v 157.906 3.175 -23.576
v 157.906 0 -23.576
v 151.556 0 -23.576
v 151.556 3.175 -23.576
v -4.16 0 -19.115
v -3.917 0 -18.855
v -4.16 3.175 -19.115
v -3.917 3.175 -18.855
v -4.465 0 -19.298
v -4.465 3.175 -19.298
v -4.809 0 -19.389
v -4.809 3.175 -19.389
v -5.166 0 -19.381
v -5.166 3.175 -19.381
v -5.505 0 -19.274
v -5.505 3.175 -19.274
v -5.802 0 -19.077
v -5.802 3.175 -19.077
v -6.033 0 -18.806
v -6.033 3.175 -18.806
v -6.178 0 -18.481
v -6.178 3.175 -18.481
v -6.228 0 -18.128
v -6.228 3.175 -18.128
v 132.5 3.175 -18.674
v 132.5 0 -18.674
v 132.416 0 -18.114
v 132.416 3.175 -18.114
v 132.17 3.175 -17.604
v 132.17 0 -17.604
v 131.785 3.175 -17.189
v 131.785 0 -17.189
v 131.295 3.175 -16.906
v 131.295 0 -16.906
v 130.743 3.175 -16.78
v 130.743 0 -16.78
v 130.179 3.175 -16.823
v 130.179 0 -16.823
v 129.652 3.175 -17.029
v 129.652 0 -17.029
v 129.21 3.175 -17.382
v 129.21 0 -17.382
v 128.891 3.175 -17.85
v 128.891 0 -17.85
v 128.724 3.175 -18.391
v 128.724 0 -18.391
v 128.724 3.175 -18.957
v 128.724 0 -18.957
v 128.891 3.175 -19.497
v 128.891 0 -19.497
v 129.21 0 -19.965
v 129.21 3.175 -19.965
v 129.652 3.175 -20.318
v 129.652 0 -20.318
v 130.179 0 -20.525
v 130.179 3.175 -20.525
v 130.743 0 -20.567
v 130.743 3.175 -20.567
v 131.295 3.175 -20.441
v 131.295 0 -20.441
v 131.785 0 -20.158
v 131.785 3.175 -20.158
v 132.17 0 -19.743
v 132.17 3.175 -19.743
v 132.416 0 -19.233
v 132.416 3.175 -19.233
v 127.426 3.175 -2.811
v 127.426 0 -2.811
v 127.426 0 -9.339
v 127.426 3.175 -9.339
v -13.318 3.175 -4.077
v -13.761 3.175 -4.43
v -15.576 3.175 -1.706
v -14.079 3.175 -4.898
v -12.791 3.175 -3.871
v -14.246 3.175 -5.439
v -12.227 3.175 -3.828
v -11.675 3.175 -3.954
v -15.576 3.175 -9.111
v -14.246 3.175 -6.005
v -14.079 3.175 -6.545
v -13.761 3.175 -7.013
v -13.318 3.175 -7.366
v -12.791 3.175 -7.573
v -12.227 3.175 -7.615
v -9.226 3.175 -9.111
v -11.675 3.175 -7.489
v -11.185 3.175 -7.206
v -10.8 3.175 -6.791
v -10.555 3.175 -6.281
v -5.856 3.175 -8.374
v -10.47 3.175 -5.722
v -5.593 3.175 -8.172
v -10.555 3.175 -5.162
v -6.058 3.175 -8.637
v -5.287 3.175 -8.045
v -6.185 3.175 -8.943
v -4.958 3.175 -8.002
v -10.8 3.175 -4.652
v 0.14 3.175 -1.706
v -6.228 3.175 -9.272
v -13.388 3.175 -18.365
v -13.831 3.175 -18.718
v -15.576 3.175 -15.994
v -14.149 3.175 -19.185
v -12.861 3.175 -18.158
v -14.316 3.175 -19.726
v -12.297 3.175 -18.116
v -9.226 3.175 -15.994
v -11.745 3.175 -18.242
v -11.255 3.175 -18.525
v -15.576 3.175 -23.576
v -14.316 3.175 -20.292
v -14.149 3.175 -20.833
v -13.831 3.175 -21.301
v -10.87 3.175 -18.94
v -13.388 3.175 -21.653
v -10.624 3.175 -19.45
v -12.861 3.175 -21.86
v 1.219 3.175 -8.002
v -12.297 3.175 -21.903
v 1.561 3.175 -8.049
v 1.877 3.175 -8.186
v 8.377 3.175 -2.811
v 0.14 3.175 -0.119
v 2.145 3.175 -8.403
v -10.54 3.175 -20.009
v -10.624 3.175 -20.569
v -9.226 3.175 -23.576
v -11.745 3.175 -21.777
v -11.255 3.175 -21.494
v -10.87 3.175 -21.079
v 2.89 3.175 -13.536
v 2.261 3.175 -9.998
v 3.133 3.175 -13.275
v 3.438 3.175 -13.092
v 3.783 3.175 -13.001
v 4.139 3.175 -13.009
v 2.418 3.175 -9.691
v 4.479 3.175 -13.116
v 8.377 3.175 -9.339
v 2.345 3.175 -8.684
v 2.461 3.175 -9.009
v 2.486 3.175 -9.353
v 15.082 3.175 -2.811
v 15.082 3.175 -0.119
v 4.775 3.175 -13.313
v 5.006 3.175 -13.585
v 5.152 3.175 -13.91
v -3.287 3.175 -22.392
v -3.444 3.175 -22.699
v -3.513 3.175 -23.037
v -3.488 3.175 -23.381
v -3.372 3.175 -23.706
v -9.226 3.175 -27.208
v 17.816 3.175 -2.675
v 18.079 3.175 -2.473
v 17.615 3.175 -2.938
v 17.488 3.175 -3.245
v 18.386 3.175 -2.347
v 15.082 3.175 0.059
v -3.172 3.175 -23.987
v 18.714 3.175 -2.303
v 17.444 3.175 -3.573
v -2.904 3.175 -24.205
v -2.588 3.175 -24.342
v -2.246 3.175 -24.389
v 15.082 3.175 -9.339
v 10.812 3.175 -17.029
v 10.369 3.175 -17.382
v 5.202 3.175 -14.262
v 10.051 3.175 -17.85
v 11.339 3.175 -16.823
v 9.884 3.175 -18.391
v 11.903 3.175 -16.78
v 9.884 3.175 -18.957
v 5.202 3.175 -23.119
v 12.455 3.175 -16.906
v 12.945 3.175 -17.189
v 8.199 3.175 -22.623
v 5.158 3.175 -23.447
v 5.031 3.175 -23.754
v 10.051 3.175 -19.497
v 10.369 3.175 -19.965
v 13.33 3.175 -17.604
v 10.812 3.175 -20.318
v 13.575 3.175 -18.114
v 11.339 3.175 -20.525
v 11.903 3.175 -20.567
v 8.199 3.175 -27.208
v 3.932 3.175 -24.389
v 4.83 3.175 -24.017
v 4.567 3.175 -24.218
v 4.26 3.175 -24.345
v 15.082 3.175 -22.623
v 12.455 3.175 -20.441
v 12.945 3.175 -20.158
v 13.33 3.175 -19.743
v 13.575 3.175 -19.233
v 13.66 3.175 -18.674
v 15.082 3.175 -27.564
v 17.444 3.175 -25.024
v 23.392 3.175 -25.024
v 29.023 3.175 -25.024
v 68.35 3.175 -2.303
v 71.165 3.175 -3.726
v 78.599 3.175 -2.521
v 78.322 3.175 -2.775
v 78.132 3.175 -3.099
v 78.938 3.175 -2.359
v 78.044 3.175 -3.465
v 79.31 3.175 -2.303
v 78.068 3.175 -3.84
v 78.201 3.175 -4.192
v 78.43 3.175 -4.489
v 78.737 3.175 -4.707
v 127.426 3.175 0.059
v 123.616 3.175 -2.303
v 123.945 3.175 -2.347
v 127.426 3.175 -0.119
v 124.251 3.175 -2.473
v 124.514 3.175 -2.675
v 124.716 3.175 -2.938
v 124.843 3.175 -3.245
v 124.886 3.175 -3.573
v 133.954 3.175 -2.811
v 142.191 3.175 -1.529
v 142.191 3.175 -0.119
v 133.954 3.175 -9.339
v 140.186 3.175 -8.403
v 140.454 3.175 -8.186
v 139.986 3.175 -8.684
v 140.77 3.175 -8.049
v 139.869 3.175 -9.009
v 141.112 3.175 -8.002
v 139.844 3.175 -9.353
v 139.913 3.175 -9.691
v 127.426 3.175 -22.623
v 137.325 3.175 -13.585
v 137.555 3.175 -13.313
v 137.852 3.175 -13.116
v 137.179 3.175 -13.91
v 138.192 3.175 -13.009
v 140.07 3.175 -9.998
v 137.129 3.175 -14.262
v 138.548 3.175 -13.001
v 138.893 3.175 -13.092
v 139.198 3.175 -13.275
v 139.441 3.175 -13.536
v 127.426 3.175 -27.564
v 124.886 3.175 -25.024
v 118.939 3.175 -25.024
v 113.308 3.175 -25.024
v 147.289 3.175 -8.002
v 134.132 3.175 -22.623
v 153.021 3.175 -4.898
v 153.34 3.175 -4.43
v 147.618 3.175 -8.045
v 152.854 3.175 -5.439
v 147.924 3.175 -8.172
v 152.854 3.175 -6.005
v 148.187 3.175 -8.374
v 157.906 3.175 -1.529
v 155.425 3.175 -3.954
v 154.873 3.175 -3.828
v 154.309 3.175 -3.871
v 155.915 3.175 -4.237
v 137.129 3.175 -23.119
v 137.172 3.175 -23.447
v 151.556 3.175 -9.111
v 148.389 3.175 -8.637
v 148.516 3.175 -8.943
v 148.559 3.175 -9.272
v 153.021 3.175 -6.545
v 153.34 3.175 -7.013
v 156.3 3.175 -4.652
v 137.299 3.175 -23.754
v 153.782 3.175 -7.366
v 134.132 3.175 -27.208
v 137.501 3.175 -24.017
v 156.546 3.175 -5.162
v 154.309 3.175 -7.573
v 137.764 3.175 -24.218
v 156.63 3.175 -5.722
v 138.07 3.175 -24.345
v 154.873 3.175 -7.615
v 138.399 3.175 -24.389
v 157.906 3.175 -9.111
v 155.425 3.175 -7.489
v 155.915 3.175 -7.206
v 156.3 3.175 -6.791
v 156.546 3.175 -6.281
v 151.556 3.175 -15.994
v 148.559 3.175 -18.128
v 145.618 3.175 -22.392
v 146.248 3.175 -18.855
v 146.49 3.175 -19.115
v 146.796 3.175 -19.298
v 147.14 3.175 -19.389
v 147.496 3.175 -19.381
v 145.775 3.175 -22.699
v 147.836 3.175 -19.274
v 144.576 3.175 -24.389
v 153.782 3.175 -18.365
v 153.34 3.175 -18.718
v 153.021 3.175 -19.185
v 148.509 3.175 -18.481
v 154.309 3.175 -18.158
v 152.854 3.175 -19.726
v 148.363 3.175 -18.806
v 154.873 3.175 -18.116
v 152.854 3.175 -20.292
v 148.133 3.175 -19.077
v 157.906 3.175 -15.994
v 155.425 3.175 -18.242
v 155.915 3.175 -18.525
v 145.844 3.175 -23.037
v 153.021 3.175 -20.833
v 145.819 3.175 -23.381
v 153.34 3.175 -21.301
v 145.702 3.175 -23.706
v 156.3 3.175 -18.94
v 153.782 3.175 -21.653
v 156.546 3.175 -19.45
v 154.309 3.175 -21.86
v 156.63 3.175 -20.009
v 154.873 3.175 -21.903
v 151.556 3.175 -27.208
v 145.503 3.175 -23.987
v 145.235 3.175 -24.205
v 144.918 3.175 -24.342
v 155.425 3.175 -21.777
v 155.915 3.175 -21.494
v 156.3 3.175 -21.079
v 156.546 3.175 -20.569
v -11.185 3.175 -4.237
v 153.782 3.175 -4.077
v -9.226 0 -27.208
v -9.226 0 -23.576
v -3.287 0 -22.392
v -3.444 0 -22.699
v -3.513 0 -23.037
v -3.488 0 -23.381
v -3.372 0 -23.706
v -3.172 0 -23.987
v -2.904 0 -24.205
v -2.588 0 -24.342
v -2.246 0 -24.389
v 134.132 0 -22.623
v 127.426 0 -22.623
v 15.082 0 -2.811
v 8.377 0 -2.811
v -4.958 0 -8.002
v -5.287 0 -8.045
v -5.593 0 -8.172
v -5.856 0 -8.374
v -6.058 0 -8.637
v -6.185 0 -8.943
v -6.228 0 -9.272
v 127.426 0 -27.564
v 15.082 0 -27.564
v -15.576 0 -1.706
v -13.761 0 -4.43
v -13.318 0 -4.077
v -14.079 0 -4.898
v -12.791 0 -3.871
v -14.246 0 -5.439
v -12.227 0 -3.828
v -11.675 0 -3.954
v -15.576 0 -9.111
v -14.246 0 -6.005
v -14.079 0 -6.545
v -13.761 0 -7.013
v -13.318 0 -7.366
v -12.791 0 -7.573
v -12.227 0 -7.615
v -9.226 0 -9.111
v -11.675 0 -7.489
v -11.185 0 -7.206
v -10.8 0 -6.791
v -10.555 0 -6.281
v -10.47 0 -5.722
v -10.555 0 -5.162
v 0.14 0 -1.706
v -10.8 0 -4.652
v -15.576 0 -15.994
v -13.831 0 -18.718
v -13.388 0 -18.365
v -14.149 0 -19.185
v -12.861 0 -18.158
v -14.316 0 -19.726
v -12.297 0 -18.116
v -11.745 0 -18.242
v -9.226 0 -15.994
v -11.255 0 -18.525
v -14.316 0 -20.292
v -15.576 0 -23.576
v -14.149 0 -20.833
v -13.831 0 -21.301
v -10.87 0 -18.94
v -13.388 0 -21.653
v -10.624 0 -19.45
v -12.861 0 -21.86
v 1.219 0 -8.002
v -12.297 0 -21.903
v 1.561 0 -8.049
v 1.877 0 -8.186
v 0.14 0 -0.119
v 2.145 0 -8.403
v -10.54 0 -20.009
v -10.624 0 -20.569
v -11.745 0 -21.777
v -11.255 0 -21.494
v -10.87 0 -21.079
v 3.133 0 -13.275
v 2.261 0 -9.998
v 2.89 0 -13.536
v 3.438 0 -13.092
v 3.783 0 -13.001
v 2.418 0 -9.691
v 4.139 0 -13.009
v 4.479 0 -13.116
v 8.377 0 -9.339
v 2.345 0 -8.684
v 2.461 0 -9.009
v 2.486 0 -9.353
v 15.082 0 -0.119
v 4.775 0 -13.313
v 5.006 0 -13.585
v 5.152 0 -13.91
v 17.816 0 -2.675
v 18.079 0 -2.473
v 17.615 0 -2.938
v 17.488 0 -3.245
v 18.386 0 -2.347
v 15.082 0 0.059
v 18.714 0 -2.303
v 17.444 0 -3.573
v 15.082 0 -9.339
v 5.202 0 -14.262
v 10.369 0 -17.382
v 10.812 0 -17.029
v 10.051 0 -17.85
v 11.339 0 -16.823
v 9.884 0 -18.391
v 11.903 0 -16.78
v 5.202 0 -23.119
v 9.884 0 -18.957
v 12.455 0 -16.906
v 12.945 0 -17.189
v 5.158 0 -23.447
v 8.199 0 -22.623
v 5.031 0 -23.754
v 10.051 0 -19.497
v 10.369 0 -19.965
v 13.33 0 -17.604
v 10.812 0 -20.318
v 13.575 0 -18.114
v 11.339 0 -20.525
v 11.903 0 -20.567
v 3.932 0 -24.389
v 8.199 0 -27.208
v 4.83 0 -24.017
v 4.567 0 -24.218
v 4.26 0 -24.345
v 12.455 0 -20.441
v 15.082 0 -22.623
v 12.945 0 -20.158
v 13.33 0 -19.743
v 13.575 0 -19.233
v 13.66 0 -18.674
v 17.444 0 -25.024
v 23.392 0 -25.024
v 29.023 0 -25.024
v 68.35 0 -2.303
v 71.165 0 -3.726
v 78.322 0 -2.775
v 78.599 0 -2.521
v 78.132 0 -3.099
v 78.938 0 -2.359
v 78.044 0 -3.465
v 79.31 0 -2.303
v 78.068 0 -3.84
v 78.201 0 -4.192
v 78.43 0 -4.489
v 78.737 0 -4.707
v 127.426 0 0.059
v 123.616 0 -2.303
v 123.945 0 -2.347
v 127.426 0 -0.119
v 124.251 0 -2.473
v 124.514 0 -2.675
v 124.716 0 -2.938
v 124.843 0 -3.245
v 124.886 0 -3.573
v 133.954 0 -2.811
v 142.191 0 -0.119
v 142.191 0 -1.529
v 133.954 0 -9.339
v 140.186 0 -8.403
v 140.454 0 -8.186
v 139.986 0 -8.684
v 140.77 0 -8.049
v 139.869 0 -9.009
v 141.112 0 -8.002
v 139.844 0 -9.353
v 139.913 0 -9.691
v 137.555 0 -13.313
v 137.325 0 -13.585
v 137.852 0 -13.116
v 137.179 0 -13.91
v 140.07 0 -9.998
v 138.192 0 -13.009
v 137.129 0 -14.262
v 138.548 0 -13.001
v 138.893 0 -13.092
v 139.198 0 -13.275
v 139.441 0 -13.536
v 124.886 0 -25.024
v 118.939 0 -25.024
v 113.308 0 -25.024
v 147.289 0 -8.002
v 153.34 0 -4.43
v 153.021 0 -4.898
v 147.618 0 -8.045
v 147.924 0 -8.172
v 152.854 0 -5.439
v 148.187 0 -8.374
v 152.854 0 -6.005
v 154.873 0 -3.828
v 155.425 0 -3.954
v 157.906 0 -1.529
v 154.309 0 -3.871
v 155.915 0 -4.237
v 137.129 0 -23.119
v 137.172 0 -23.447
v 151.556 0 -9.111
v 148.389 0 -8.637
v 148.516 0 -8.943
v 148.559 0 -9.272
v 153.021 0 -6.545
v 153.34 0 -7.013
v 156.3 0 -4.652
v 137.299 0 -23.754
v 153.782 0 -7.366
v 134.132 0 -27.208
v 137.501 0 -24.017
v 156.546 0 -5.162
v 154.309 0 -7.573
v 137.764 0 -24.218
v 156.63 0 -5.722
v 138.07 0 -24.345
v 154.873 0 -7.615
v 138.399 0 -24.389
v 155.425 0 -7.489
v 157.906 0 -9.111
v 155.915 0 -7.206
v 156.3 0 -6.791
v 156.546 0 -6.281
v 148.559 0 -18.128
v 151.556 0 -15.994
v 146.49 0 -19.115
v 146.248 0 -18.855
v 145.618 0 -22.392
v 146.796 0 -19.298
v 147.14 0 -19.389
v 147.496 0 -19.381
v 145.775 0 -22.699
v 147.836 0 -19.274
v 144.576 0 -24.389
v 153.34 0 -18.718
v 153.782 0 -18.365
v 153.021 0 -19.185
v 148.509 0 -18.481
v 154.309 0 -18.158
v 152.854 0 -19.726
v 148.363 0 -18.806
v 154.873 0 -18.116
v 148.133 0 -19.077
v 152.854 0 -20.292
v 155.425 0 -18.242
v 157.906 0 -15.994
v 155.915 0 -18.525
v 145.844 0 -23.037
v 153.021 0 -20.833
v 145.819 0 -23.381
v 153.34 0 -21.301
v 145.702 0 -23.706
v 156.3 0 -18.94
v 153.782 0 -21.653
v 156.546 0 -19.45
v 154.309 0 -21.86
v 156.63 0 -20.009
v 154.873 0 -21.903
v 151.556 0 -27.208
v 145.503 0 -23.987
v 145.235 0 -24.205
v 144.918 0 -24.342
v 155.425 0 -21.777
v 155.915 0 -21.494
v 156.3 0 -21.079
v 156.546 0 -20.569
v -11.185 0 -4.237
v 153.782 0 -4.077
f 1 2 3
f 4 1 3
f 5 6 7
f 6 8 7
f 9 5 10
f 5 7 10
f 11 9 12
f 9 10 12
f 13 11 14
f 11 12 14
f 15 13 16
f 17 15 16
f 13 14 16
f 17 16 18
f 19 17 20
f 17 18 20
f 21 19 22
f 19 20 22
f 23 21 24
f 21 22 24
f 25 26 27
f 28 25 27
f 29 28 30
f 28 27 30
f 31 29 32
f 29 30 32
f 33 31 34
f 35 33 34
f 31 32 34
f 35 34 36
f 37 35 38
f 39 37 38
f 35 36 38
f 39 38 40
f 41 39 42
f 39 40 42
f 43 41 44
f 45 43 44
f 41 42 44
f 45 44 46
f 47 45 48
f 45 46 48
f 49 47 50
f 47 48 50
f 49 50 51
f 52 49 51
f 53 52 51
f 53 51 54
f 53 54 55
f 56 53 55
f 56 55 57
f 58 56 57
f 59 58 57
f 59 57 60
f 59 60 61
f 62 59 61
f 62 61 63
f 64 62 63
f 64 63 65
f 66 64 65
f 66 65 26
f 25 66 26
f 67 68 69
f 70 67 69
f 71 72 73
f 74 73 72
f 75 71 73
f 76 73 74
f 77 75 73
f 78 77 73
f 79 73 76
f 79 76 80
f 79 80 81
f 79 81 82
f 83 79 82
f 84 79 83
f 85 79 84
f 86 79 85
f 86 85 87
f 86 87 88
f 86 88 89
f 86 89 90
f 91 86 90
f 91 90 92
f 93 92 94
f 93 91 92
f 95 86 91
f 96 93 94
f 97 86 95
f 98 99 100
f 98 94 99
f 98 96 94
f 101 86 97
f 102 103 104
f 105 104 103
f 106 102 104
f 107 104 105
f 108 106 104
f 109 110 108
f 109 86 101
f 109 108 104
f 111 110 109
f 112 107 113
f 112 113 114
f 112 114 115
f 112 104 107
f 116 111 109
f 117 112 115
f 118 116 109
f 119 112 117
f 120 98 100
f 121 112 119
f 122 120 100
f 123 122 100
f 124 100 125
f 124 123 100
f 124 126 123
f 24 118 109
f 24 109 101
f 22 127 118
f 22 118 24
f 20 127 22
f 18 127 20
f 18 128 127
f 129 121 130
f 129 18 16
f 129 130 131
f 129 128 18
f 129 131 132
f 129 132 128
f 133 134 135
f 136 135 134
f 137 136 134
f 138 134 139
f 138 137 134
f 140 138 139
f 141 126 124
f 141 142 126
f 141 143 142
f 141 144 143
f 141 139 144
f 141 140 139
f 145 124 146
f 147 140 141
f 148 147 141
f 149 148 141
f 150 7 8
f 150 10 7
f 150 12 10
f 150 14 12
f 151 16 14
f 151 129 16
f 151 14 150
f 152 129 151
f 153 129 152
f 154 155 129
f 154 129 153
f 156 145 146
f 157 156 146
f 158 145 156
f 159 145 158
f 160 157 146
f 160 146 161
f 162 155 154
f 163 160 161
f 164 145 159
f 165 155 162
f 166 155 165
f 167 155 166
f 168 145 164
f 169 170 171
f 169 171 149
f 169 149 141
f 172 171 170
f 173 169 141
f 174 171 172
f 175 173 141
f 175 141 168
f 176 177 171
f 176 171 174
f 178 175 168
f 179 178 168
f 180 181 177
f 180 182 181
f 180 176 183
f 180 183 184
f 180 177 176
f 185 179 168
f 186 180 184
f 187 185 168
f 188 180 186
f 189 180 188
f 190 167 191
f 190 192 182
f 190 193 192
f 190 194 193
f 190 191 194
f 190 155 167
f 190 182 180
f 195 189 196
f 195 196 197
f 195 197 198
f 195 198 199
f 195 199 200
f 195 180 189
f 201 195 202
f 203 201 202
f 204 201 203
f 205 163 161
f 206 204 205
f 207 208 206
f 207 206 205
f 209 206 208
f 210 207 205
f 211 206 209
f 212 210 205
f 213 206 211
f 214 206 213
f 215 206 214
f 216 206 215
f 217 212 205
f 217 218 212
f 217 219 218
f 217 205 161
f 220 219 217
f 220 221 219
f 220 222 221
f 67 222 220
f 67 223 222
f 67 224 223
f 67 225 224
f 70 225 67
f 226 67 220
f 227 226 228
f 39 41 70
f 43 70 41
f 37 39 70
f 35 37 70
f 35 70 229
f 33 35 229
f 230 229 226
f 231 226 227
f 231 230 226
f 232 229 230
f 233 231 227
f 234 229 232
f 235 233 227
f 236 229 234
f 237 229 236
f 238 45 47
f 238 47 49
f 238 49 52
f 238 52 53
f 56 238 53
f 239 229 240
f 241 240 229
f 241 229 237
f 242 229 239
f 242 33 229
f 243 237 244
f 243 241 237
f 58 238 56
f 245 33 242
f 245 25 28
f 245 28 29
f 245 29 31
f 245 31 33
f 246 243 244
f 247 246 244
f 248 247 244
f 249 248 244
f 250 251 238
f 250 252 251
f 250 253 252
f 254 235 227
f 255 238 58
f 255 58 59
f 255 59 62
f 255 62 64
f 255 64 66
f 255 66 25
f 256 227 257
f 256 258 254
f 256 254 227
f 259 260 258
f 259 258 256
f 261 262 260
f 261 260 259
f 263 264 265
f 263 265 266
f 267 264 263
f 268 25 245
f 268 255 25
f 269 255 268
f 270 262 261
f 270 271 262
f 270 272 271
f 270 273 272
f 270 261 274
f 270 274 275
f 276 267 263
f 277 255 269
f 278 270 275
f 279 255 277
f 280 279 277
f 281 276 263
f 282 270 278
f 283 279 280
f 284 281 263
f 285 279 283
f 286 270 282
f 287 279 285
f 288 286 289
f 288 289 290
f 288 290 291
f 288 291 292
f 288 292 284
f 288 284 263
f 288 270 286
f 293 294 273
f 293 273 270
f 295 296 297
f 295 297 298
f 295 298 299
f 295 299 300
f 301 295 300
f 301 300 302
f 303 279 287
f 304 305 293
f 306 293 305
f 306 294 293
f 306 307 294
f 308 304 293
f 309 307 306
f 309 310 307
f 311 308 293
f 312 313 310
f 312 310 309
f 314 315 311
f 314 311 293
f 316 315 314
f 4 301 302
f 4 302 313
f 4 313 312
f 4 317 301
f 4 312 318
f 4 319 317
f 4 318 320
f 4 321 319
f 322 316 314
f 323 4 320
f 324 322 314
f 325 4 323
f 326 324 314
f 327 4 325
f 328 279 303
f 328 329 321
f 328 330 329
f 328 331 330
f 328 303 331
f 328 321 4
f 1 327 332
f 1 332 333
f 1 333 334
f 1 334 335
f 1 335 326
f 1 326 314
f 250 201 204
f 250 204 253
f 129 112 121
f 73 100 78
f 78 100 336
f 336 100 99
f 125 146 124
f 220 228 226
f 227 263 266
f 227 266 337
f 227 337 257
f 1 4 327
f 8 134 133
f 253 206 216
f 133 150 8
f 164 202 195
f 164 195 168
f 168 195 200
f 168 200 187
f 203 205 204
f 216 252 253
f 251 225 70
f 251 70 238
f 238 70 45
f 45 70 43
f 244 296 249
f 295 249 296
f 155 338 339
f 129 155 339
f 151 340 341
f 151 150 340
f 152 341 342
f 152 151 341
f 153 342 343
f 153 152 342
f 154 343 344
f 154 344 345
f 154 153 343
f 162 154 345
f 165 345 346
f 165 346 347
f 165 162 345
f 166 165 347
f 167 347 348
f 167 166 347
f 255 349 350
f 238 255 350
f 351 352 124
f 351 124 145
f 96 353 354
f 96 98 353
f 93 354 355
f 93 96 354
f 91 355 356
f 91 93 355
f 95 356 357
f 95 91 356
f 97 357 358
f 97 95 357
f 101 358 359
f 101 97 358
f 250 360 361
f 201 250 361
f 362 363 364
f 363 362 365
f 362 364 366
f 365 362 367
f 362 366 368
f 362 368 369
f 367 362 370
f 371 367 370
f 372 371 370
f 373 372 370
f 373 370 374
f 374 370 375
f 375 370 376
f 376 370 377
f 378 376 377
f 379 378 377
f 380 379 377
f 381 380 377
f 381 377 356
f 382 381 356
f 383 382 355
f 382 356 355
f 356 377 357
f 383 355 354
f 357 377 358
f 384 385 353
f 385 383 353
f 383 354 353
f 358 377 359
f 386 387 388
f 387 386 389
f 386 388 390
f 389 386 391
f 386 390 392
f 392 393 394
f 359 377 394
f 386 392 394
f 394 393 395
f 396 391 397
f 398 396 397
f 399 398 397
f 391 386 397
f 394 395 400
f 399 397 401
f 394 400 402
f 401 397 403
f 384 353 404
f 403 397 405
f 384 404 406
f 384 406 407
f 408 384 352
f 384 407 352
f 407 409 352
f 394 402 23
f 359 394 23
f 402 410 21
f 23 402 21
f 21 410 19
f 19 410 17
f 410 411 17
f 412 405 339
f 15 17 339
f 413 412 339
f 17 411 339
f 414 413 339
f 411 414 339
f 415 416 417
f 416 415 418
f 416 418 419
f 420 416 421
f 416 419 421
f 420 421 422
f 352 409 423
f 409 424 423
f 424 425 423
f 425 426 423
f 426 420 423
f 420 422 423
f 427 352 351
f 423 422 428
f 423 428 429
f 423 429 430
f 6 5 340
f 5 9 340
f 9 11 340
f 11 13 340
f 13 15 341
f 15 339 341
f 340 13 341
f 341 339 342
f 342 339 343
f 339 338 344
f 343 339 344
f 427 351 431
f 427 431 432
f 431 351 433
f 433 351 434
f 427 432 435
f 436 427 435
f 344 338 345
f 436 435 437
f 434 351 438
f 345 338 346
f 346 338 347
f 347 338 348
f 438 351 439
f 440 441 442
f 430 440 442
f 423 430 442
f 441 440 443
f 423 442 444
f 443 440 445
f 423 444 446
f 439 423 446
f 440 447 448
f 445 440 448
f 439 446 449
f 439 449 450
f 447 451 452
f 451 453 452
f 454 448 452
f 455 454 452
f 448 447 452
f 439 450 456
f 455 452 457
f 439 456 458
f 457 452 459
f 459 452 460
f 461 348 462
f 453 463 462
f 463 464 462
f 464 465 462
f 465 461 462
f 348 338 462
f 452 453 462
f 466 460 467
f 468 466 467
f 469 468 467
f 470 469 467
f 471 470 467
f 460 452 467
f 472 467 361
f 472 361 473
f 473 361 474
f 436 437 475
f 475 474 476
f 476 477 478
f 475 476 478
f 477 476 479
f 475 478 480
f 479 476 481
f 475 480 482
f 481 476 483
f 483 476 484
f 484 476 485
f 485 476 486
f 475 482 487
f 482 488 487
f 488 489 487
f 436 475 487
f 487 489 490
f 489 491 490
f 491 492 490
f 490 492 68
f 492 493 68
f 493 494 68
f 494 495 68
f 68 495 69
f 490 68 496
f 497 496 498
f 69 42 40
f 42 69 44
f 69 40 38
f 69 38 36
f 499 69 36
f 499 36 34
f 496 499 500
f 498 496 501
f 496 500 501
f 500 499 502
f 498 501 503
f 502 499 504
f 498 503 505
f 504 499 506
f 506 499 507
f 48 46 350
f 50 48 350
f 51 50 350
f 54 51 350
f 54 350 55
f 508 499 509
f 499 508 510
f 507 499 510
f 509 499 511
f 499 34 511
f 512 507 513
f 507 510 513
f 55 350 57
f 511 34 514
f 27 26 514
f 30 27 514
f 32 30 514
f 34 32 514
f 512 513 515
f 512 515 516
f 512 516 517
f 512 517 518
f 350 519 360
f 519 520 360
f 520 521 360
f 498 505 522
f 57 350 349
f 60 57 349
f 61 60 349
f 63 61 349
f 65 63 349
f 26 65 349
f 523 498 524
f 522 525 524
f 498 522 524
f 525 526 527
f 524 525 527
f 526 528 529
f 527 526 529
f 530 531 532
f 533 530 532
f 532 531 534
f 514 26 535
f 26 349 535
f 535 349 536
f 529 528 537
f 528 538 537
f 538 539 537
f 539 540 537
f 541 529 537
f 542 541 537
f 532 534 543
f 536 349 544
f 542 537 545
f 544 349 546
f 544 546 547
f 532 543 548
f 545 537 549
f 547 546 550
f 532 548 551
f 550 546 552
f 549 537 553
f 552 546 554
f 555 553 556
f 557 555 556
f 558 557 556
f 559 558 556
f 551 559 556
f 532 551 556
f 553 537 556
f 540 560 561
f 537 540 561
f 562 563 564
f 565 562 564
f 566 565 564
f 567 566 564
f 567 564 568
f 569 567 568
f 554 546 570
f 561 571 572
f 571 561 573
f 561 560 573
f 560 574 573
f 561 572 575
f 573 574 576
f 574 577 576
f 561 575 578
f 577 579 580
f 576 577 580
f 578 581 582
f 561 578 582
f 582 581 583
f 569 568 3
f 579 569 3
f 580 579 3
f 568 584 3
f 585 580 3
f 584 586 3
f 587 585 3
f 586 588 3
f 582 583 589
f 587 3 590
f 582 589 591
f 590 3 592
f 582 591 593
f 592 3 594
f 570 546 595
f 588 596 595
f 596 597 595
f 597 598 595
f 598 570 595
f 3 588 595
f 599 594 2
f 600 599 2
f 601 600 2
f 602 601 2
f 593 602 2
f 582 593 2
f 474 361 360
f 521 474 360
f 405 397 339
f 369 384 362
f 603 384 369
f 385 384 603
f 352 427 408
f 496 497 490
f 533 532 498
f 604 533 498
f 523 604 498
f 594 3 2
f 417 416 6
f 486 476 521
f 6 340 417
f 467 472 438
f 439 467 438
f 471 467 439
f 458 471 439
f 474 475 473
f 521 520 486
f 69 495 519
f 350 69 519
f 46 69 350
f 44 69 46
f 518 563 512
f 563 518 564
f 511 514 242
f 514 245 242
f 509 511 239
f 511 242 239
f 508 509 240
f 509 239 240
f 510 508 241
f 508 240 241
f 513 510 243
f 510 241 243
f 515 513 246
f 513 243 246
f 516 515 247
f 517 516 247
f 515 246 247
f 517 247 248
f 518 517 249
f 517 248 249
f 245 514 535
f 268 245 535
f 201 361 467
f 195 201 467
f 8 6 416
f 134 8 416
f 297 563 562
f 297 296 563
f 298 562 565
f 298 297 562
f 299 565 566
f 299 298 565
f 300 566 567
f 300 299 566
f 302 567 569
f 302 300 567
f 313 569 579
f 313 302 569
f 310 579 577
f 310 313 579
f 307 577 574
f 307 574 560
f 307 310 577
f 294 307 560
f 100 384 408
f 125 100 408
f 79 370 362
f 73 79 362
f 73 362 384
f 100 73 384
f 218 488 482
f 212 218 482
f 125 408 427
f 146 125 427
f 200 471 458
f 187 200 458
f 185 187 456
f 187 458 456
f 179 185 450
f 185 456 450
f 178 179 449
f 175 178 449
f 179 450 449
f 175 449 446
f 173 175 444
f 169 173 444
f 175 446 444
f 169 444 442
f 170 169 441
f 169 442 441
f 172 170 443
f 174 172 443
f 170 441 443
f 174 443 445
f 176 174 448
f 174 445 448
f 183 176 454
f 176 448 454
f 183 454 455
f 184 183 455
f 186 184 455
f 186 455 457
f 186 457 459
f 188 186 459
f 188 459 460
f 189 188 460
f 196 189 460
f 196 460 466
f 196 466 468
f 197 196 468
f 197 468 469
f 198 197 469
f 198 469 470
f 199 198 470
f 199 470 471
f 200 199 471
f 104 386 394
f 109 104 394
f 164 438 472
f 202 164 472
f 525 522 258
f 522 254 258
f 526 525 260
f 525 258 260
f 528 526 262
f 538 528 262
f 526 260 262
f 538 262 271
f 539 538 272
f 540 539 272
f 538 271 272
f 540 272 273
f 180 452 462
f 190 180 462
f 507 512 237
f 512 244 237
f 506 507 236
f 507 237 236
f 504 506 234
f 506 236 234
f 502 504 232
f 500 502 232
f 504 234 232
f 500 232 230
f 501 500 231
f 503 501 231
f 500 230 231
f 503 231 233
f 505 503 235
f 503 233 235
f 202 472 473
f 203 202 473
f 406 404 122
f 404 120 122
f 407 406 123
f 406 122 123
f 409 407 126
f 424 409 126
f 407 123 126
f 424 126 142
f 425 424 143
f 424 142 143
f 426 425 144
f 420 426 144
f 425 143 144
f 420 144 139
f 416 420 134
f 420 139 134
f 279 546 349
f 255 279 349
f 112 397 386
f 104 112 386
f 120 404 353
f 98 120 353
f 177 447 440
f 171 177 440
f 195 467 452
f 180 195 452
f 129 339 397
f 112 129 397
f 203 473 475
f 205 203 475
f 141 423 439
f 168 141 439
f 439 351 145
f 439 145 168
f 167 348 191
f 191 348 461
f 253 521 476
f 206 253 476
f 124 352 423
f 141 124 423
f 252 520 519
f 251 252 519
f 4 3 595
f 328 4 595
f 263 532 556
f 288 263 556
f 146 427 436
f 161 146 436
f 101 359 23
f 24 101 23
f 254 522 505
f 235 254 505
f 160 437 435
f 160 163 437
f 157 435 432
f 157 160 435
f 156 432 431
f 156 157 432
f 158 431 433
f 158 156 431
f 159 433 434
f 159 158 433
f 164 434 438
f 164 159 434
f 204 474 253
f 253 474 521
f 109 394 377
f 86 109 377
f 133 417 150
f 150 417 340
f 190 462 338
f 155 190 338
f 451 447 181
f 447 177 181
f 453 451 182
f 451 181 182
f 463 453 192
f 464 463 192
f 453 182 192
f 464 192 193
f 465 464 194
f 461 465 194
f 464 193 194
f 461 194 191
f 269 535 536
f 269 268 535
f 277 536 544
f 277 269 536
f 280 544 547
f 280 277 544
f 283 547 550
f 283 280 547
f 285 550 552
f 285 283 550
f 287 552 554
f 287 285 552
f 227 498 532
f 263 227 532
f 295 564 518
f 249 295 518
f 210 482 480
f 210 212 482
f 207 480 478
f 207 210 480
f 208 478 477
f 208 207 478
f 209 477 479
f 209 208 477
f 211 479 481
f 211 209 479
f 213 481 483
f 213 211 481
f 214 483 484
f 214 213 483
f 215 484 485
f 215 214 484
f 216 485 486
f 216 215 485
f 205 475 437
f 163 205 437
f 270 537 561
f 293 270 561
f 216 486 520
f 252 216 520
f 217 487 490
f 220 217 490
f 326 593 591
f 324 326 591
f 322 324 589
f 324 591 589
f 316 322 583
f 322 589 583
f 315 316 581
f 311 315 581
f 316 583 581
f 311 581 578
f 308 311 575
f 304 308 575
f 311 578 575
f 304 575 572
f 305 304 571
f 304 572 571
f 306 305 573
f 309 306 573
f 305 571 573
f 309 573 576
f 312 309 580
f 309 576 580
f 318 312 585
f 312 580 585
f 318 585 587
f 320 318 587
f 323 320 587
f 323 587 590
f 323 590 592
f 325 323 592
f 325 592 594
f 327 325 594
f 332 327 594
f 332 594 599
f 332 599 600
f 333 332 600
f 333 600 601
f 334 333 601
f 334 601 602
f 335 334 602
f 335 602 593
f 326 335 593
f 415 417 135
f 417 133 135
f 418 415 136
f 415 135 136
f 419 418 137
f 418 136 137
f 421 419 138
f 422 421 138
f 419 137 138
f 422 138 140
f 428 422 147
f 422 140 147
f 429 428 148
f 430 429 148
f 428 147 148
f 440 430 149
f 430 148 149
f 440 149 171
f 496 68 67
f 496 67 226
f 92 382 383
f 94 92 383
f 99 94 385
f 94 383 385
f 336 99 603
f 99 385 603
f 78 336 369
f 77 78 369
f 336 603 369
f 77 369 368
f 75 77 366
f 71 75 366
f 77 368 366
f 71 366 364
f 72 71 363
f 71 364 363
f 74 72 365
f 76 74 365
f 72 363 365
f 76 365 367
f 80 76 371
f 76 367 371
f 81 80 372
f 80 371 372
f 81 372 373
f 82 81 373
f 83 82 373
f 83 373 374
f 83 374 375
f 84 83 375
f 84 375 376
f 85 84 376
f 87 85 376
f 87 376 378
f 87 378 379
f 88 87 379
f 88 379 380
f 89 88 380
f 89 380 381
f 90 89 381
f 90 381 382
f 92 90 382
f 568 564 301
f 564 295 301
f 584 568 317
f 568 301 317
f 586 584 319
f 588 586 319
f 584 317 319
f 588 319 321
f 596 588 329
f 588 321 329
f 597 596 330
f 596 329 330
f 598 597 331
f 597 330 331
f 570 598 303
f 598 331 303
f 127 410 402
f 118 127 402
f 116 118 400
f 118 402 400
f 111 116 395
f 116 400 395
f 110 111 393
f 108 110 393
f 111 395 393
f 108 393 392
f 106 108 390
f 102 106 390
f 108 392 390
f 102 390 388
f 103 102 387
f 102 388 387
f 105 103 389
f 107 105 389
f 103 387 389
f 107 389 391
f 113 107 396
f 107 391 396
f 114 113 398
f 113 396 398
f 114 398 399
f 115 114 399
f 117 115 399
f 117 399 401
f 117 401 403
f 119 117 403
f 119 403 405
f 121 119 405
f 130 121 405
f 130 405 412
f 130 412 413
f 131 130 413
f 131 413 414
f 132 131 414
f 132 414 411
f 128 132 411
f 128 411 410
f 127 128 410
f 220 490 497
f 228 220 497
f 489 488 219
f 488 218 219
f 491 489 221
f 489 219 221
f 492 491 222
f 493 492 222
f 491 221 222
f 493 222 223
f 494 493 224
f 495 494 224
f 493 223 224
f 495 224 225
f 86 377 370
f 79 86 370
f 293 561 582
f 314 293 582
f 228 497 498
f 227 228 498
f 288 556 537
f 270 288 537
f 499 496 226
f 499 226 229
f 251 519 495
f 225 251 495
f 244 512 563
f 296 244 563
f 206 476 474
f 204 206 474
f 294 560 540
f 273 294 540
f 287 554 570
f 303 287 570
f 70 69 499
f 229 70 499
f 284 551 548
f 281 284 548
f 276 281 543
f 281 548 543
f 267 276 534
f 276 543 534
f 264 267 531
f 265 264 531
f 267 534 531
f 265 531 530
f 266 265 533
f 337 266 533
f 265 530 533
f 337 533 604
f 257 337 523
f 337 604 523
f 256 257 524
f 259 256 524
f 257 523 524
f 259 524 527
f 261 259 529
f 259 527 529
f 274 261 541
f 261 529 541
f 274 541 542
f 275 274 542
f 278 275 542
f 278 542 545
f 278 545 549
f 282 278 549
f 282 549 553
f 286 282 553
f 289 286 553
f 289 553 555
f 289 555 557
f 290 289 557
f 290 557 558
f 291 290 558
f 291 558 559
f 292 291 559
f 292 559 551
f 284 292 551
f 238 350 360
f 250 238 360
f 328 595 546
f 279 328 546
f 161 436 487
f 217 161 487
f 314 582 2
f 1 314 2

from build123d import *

# Parameters (mm, degrees)
SKETCH1_W                 = 6.7056
SKETCH1_H                 = 6.5278
SKETCH1_W_2               = 6.5278
BOSS_EXTRUDE1_DEPTH       = 3.175
F_6_CLEARANCE_HOLE1_D     = 3.7973
F_6_CLEARANCE_HOLE1_DEPTH = 6.35
F_6_CLEARANCE_HOLE1_TIP   = 1.140824014
FILLET1_R                 = 1.27


with BuildPart() as part:
    # Sketch1 → Boss-Extrude1 (new body)
    with BuildSketch(Plane(origin=(0, 0, 0), x_dir=(1, 0, 0), z_dir=(0, 1, 0))):
        Polygon((127.426380641, 27.563643867), (15.082180641, 27.563643867), (15.082180641, 22.623343867), (8.198780641, 22.623343867), (8.198780641, 27.208043867), (-9.225619359, 27.208043867), (-9.225619359, 23.575843867), (-15.575619359, 23.575843867), (-15.575619359, 15.993943867), (-9.225619359, 15.993943867), (-9.225619359, 9.110543867), (-15.575619359, 9.110543867), (-15.575619359, 1.706443867), (0.1397, 1.706443867), (0.1397, 0.118943867), (15.082180641, 0.118943867), (15.082180641, -0.058856133), (127.426380641, -0.058856133), (127.426380641, 0.118943867), (142.191061281, 0.118943867), (142.191061281, 1.528643867), (157.906380641, 1.528643867), (157.906380641, 9.110543867), (151.556380641, 9.110543867), (151.556380641, 15.993943867), (157.906380641, 15.993943867), (157.906380641, 23.575843867), (151.556380641, 23.575843867), (151.556380641, 27.208043867), (134.131980641, 27.208043867), (134.131980641, 22.623343867), (127.426380641, 22.623343867), align=None)
        with Locations((11.729380641, 6.075243867)):
            Rectangle(SKETCH1_W, SKETCH1_H, mode=Mode.SUBTRACT)
        Polygon((68.349676501, 2.303343867), (17.444380641, 2.303343867), (17.444380641, 25.023643867), (23.391676501, 25.023643867), align=None, mode=Mode.SUBTRACT)
        with Locations((130.690280641, 6.075243867)):
            Rectangle(SKETCH1_W_2, SKETCH1_H, mode=Mode.SUBTRACT)
        Polygon((73.981084781, 2.303343867), (118.939084781, 25.023643867), (124.886380641, 25.023643867), (124.886380641, 2.303343867), align=None, mode=Mode.SUBTRACT)
        Polygon((-6.228419359, 8.001876918), (-6.228419359, 22.168725531), (3.653156436, 8.001876918), align=None, mode=Mode.SUBTRACT)
        Polygon((-4.679995154, 24.388643867), (5.201580641, 24.388643867), (5.201580641, 10.221795255), align=None, mode=Mode.SUBTRACT)
        Polygon((113.307676501, 25.023643867), (71.165380641, 3.726308474), (29.023084781, 25.023643867), align=None, mode=Mode.SUBTRACT)
        Polygon((148.559180641, 22.168725531), (148.559180641, 8.001876918), (138.677604846, 8.001876918), align=None, mode=Mode.SUBTRACT)
        Polygon((137.129180641, 24.388643867), (147.010756436, 24.388643867), (137.129180641, 10.221795255), align=None, mode=Mode.SUBTRACT)
    extrude(amount=BOSS_EXTRUDE1_DEPTH)

    # #6 Clearance Hole1
    with Locations(Plane(origin=(0.024087856, 3.175, -12.509508824), x_dir=(-1, 0, 0), z_dir=(0, 1, 0))):
        with Locations((-130.577292784, -6.164135043), (-154.707292784, -7.499674703), (-154.707292784, 6.787825297), (-11.737042784, -6.164130843), (12.392957216, 6.787829497), (12.462807216, -7.499674703)):
            Hole(F_6_CLEARANCE_HOLE1_D / 2, depth=F_6_CLEARANCE_HOLE1_DEPTH)
            with Locations((0, 0, -(F_6_CLEARANCE_HOLE1_DEPTH + F_6_CLEARANCE_HOLE1_TIP / 2))):  # 118° drill point
                Cone(0, F_6_CLEARANCE_HOLE1_D / 2, F_6_CLEARANCE_HOLE1_TIP, mode=Mode.SUBTRACT)

    # Fillet1
    fillet1_edges = [part.edges().sort_by_distance(p)[0] for p in [
        (-6.228419359, 1.5875, -22.168725531),
        (-6.228419359, 1.5875, -8.001876918),
        (3.653156436, 1.5875, -8.001876918),
        (124.886380641, 1.5875, -2.303343867),
        (73.981084781, 1.5875, -2.303343867),
        (17.444380641, 1.5875, -2.303343867),
        (138.677604846, 1.5875, -8.001876918),
        (148.559180641, 1.5875, -8.001876918),
        (148.559180641, 1.5875, -22.168725531),
        (137.129180641, 1.5875, -24.388643867),
        (137.129180641, 1.5875, -10.221795255),
        (147.010756436, 1.5875, -24.388643867),
        (5.201580641, 1.5875, -10.221795255),
        (5.201580641, 1.5875, -24.388643867),
        (-4.679995154, 1.5875, -24.388643867),
    ]]
    fillet(fillet1_edges, radius=FILLET1_R)


solid = part.part
